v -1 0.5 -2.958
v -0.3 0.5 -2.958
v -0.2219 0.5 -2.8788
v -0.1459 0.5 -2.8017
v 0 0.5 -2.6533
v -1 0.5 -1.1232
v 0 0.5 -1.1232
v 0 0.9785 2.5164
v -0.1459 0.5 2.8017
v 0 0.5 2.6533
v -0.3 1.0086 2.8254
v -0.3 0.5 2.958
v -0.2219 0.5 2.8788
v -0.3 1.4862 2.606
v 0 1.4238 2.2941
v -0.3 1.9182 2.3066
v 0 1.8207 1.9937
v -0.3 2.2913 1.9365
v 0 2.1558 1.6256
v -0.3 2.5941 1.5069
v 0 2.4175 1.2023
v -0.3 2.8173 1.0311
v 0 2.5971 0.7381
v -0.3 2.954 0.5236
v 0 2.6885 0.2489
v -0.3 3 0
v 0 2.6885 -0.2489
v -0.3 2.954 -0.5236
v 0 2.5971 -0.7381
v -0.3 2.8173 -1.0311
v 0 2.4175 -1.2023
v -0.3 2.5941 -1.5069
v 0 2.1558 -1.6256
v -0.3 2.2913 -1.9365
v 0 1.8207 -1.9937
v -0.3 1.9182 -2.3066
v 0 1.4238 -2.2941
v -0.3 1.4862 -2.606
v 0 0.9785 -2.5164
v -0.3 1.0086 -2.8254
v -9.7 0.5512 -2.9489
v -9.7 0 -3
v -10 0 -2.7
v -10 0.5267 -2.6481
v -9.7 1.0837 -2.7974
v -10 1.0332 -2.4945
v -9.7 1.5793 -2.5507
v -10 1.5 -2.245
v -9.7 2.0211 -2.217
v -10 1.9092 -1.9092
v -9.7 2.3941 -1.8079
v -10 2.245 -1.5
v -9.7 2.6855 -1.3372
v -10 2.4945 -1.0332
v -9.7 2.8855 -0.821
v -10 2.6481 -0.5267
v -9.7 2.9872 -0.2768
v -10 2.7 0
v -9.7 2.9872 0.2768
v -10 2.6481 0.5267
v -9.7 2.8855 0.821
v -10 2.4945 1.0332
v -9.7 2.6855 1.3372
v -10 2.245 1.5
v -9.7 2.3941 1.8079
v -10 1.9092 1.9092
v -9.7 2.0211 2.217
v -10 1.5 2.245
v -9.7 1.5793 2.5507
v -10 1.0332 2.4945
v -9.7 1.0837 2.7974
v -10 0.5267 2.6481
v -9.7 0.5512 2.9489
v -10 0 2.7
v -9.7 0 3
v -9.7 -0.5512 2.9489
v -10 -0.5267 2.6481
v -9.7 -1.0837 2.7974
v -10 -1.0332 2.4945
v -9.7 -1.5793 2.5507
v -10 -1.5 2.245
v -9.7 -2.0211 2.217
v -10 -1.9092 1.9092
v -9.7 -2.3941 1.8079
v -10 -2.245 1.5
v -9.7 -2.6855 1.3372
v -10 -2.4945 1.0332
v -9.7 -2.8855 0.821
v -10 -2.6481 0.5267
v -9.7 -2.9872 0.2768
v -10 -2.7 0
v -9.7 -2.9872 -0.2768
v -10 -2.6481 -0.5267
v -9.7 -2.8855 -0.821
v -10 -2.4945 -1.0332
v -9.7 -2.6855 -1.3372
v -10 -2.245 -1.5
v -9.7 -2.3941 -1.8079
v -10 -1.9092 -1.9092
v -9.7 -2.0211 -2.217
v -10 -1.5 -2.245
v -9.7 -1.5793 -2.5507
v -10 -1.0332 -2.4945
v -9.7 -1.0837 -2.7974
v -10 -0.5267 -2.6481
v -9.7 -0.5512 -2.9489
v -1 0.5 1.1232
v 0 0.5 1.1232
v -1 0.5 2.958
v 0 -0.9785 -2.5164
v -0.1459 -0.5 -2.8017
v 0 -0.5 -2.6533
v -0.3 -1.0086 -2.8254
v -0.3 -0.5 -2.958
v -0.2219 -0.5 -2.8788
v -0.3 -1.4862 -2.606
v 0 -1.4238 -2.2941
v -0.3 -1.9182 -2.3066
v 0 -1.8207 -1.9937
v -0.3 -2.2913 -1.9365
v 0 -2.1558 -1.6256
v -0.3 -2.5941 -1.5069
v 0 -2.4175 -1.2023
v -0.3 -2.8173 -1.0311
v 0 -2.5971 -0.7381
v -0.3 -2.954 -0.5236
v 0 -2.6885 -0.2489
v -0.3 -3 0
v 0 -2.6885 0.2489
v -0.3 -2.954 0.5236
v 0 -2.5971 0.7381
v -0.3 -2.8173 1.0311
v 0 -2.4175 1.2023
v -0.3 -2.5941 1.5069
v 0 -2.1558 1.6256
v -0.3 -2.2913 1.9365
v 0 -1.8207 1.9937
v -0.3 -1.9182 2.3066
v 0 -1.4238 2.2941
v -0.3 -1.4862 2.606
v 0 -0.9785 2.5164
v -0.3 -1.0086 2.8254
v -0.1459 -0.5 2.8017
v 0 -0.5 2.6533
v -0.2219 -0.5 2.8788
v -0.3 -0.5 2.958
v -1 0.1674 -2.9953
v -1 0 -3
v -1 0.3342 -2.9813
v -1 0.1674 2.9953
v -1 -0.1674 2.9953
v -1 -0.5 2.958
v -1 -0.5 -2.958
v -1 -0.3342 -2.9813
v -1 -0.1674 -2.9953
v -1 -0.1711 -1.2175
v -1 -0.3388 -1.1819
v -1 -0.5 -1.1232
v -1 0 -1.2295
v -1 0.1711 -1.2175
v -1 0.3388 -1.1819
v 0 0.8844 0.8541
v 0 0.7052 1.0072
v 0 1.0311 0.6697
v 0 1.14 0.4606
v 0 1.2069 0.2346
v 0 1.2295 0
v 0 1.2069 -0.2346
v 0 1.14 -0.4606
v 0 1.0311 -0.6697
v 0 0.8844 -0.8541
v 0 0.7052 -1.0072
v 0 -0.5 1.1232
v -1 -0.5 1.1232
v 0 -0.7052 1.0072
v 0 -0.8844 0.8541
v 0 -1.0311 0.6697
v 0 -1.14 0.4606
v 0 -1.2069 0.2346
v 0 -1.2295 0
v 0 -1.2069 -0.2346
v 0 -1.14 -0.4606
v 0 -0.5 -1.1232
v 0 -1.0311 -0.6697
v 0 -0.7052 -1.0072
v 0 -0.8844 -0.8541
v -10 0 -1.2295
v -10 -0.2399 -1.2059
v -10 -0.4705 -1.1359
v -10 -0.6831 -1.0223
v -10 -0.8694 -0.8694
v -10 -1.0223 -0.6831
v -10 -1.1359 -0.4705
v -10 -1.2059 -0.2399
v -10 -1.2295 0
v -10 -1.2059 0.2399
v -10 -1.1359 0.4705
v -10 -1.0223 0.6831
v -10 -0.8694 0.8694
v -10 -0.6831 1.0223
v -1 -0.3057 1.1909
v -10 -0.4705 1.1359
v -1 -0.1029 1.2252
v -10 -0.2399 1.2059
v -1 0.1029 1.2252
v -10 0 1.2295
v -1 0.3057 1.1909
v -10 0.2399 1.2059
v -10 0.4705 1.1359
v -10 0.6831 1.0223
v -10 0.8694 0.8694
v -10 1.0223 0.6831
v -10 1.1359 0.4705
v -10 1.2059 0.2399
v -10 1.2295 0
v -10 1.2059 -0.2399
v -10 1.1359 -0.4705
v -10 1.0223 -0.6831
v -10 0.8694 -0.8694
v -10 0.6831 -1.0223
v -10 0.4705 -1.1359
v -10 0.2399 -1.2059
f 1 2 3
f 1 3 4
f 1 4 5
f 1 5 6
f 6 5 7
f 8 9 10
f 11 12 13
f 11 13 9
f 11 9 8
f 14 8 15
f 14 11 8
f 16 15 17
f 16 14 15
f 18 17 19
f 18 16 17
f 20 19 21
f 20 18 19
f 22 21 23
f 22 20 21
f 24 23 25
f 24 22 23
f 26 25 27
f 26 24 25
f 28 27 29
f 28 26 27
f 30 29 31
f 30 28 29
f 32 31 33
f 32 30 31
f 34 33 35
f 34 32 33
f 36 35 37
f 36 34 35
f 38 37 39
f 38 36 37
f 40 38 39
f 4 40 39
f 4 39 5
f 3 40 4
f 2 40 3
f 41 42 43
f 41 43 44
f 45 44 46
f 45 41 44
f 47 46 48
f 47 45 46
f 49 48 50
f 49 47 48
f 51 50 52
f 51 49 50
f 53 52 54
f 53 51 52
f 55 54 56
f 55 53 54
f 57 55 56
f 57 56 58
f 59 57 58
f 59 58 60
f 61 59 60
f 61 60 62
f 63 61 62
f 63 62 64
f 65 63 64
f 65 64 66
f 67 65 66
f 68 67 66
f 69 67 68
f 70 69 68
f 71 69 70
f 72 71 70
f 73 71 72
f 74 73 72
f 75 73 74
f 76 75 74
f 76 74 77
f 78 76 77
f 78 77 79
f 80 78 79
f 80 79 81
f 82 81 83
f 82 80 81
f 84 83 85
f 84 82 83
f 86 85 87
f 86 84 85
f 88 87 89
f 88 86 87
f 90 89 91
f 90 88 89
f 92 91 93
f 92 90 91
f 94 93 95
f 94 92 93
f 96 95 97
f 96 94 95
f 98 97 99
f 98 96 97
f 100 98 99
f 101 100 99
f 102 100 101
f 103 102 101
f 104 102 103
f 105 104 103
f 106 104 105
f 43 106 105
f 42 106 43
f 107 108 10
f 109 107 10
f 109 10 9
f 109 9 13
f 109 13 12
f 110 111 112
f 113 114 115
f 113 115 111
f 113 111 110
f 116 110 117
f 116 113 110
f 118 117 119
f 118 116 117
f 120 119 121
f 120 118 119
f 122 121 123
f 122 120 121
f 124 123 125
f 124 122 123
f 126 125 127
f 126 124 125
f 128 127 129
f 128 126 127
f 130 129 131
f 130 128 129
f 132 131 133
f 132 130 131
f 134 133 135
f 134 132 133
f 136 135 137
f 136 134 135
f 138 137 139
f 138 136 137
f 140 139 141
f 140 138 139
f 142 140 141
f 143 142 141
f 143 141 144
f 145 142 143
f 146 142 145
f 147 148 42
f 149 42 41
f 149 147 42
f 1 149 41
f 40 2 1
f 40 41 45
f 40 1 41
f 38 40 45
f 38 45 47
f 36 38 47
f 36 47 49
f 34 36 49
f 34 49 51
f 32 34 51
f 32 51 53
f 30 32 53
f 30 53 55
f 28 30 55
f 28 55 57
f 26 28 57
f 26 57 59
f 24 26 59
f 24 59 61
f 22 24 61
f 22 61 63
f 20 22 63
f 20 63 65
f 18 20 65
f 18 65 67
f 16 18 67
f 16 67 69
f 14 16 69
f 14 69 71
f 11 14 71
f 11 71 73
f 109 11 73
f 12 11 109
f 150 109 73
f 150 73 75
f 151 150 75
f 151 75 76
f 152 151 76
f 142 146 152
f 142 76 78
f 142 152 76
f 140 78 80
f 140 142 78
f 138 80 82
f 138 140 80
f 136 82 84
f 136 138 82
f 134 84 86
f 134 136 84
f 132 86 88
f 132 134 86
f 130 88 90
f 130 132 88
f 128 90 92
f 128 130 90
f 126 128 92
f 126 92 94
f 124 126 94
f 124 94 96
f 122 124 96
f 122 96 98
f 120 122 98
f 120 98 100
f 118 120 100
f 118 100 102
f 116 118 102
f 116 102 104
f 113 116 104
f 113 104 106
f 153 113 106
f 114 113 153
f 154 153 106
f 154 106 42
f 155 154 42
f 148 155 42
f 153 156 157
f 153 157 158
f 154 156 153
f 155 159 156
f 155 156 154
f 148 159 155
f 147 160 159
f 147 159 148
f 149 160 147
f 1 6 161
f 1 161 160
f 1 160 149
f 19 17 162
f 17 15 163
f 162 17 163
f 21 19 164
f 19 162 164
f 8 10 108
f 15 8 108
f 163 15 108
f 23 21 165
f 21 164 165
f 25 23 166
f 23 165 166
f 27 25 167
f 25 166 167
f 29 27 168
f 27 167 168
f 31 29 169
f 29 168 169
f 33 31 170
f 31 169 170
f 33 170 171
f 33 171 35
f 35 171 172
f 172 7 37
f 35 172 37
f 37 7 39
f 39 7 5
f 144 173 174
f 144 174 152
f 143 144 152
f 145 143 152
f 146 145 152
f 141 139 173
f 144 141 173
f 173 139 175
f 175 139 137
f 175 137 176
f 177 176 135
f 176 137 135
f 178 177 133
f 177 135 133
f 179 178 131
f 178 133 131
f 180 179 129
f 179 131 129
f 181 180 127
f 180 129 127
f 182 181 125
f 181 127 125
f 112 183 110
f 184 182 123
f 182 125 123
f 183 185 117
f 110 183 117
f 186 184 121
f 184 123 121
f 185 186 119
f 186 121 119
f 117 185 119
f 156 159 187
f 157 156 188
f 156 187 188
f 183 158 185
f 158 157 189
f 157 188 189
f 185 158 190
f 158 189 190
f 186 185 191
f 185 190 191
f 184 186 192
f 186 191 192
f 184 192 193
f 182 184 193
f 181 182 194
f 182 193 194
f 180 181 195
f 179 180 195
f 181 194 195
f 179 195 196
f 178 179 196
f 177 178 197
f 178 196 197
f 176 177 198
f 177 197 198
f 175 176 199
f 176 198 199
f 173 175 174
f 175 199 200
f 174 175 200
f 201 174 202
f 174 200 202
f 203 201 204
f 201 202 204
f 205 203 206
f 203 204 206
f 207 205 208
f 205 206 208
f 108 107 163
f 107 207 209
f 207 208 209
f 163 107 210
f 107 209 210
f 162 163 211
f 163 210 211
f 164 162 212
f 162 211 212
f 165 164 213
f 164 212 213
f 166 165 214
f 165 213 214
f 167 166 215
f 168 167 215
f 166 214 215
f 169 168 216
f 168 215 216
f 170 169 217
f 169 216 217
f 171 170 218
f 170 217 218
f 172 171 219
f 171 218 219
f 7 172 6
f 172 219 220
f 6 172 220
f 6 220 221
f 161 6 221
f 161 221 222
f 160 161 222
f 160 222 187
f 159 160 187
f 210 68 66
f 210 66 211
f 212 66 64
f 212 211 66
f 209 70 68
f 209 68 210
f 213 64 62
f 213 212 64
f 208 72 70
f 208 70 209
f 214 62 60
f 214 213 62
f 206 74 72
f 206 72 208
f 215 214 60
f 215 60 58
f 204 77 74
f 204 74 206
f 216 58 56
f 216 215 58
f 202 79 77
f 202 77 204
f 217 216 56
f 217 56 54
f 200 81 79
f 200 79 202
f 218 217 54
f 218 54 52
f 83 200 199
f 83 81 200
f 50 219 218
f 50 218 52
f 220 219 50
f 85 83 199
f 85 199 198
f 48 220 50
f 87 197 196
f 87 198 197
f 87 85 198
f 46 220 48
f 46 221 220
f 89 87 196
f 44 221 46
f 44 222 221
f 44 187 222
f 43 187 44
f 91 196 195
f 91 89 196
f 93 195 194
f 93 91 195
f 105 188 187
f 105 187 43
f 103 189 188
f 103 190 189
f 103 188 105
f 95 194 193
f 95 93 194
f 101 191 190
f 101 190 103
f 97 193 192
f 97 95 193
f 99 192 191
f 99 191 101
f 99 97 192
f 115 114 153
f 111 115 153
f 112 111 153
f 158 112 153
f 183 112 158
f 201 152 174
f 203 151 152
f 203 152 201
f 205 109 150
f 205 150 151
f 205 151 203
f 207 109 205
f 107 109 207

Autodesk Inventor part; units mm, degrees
ref_plane "YZ Plane" through (0, 0, 0) normal (1, 0, 0) x (0, 1, 0)
ref_plane "XZ Plane" through (0, 0, 0) normal (0, 1, 0) x (-1, 0, 0)
ref_plane "XY Plane" through (0, 0, 0) normal (0, 0, 1) x (1, 0, 0)
sketch "スケッチ1" plane through (0, 0, 0) normal (0, 1, 0) x (-1, 0, 0)
  line L0 (0, 0) -> (10, 0)
  line L1 (10, 0) -> (10, -3)
  line L2 (10, -3) -> (0, -3)
  line L3 (0, -3) -> (0, 0)
  dimension "d0" = 10
  dimension "d1" = 3
revolve "回転1" add sketch "スケッチ1" angle 360 about axis through (0, 0, 0) along (-1, 0, 0)
sketch "スケッチ2" plane through (0, 0, 0) normal (1, 0, 0) x (0, 0, -1)
  point P0 (0, 0)
  point P1 (0, 0)
hole "穴1" at (0, 0, 0) direction (-1, 0, 0) diameter 2.459 end through all thread size "M3x0.5" class "6H" standard "ANSI Metric M Profile"
sketch "スケッチ3" plane through (0, 0, 0) normal (1, 0, 0) x (0, 0, -1)
  circle A0 centre (0, 0) radius 3 projected
  line L0 (3, 0) -> (-3, 0)
  line L1 (3, -0.5) -> (-3, -0.5)
  line L2 (3, 0.5) -> (-3, 0.5)
  line L3 (3, 0.5) -> (3, -0.5)
  line L4 (-3, 0.5) -> (-3, -0.5)
  point P0 (-2.958, -0.5)
  point P1 (2.958, -0.5)
  point P2 (2.958, 0.5)
  point P3 (-2.958, 0.5)
  dimension "d10" = 0.5
extrude "押し出し1" cut sketch "スケッチ3" against normal blind 1 contours L0 A0 L2 | A0 L1 L0
chamfer "面取り1" distance 0.3 angle 45 3 edges at (-10, 0, 3) (0, 3, 0) (0, -3, 0)
properties part number "ARU-3010S" material "ステンレス鋼 440C"
